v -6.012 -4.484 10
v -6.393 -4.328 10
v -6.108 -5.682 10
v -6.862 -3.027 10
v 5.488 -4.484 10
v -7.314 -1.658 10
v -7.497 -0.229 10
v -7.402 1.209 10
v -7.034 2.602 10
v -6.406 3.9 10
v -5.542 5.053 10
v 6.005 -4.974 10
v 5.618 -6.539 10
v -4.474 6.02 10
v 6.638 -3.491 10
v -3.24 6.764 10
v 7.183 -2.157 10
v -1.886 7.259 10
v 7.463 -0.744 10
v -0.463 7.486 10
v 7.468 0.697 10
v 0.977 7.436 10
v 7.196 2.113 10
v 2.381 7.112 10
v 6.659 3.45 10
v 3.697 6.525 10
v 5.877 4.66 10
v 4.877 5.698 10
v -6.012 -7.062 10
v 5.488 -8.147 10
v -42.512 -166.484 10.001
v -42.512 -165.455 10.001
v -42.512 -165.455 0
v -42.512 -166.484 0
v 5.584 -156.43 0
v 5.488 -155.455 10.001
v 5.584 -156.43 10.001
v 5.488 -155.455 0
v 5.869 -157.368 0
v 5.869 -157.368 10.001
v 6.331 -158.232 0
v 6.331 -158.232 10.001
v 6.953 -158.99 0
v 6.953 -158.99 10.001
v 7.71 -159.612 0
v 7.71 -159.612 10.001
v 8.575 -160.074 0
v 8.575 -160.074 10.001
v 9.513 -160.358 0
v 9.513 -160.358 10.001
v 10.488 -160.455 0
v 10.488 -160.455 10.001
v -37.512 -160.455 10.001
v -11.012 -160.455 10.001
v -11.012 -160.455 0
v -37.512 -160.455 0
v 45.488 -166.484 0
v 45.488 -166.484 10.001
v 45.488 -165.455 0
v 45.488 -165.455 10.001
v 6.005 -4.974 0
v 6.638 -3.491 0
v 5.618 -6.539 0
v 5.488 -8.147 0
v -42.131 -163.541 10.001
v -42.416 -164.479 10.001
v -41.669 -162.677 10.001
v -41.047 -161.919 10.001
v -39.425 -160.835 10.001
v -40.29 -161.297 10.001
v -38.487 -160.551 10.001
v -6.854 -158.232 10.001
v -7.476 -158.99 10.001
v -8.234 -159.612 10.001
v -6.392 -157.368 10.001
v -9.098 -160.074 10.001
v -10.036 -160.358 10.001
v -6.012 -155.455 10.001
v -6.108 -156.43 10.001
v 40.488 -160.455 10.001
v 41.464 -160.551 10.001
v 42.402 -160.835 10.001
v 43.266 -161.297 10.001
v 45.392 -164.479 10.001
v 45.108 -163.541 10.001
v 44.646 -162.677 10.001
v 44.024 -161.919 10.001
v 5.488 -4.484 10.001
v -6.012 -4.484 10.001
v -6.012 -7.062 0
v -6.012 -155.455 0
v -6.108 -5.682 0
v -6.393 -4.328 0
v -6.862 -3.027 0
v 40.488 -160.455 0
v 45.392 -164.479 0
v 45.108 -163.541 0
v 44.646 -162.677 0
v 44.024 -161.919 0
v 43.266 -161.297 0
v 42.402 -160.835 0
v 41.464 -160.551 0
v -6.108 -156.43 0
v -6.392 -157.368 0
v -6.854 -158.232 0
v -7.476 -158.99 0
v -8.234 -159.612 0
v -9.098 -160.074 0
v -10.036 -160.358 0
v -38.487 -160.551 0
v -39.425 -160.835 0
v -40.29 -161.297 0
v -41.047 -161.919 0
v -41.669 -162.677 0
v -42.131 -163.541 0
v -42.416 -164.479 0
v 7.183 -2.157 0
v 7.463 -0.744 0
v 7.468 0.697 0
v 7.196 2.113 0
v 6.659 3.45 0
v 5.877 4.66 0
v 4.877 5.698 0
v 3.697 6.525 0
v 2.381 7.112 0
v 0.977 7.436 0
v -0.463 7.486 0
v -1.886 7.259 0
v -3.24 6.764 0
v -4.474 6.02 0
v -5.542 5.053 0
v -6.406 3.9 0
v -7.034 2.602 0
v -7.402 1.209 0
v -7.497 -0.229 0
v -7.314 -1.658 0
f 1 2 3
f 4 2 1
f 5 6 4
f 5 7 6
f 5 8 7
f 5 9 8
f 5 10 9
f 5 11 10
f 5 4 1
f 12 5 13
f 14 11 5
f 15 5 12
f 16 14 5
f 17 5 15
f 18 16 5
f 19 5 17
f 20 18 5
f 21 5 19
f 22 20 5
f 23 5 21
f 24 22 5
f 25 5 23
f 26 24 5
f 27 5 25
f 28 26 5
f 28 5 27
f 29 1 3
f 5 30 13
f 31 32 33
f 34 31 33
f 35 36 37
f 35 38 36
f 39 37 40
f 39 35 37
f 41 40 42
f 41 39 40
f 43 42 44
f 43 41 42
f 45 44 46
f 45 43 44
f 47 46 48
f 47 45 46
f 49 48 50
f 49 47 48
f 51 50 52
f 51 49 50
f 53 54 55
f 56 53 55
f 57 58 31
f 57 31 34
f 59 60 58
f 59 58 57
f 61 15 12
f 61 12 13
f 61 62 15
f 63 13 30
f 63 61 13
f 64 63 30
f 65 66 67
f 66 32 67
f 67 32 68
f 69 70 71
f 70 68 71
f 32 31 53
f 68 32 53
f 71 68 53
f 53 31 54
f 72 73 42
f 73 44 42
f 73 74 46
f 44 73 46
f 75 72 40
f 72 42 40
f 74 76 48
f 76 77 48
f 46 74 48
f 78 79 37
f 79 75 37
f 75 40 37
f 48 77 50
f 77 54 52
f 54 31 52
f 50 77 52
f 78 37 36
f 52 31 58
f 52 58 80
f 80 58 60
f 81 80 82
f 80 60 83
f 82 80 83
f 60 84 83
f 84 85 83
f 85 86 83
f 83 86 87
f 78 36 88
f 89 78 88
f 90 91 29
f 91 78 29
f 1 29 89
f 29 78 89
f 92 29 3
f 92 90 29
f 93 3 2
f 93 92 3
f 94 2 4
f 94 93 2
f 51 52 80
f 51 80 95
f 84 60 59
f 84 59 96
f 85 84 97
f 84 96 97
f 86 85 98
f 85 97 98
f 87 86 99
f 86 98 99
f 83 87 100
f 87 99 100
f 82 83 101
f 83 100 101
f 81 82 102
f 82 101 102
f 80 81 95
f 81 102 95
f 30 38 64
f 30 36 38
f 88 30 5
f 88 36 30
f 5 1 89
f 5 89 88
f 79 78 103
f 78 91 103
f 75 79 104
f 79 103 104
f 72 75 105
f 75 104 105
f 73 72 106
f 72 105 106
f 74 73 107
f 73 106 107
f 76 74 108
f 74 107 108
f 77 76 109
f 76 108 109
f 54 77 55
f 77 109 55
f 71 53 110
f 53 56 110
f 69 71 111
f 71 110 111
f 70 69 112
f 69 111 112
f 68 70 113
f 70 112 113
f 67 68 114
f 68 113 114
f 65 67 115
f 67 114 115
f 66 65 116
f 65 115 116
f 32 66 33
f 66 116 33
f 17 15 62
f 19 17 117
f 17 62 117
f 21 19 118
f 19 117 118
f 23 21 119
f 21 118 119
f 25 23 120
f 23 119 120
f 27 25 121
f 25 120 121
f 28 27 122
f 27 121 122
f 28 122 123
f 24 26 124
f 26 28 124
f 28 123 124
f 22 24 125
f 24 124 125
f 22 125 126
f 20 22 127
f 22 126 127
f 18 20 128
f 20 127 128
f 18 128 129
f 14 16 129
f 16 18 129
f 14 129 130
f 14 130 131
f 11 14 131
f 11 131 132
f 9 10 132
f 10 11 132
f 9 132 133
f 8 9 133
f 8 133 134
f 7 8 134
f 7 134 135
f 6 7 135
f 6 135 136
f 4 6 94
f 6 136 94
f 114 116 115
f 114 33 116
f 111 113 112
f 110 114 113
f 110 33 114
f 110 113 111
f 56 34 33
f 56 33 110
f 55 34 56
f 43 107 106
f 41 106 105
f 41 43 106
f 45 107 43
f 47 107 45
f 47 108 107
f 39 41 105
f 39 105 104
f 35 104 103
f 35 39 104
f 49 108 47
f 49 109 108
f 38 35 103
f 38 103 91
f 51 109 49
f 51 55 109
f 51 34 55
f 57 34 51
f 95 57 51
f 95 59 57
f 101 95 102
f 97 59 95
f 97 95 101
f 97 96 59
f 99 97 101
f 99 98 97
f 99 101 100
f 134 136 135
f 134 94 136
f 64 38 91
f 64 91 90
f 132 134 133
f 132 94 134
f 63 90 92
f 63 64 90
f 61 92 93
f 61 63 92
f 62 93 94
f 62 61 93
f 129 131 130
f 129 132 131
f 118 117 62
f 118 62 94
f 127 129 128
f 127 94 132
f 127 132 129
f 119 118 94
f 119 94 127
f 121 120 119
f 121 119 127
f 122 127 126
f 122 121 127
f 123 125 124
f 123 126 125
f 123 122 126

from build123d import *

# Parameters (mm, degrees)
SKETCH1_R                = 7.5
BOSS_EXTRUDE2_DEPTH      = 10
SKETCH3_W                = 11.5
SKETCH3_H                = 162
BOSS_EXTRUDE3_DEPTH      = 0.001
BOSS_EXTRUDE3_DEPTH_BACK = 10
SKETCH4_W                = 10.001
SKETCH4_H                = 6.029708674
BOSS_EXTRUDE4_DEPTH      = 40
BOSS_EXTRUDE4_DEPTH_BACK = 48
FILLET1_R                = 10
FILLET2_R                = 10
FILLET3_R                = 5
FILLET4_R                = 5
FILLET5_R                = 5
FILLET6_R                = 5


with BuildPart() as part:
    # Sketch1 → Boss-Extrude2 (new body)
    with BuildSketch(Plane.XY):
        Circle(SKETCH1_R)
    extrude(amount=BOSS_EXTRUDE2_DEPTH)

    # Sketch3 → Boss-Extrude3 (add, two sides)
    with BuildSketch(Plane.XY.offset(10)) as boss_extrude3_sk:
        with Locations((-0.261803669, -85.484218622)):
            Rectangle(SKETCH3_W, SKETCH3_H)
    extrude(amount=BOSS_EXTRUDE3_DEPTH)
    extrude(boss_extrude3_sk.sketch, amount=-BOSS_EXTRUDE3_DEPTH_BACK)

    # Sketch4 → Boss-Extrude4 (add, two sides)
    with BuildSketch(Plane(origin=(5.488196331, 0, 0), x_dir=(0, 0, -1), z_dir=(1, 0, 0))) as boss_extrude4_sk:
        with Locations((-5.0005, -163.469364285)):
            Rectangle(SKETCH4_W, SKETCH4_H)
    extrude(amount=BOSS_EXTRUDE4_DEPTH)
    extrude(boss_extrude4_sk.sketch, amount=-BOSS_EXTRUDE4_DEPTH_BACK)

    # Fillet1
    fillet1_edges = [part.edges().sort_by_distance(p)[0] for p in [
        (5.488196331, -5.111721924, 5),
    ]]
    fillet(fillet1_edges, radius=FILLET1_R)

    # Fillet2
    fillet2_edges = [part.edges().sort_by_distance(p)[0] for p in [
        (-6.011803669, -4.484218622, 5),
    ]]
    fillet(fillet2_edges, radius=FILLET2_R)

    # Fillet3
    fillet3_edges = [part.edges().sort_by_distance(p)[0] for p in [
        (5.488196331, -160.454509948, 5.0005),
    ]]
    fillet(fillet3_edges, radius=FILLET3_R)

    # Fillet4
    fillet4_edges = [part.edges().sort_by_distance(p)[0] for p in [
        (-6.011803669, -160.454509948, 5.0005),
    ]]
    fillet(fillet4_edges, radius=FILLET4_R)

    # Fillet5
    fillet5_edges = [part.edges().sort_by_distance(p)[0] for p in [
        (-42.511803669, -160.454509948, 5.0005),
    ]]
    fillet(fillet5_edges, radius=FILLET5_R)

    # Fillet6
    fillet6_edges = [part.edges().sort_by_distance(p)[0] for p in [
        (45.488196331, -160.454509948, 5.0005),
    ]]
    fillet(fillet6_edges, radius=FILLET6_R)


solid = part.part
